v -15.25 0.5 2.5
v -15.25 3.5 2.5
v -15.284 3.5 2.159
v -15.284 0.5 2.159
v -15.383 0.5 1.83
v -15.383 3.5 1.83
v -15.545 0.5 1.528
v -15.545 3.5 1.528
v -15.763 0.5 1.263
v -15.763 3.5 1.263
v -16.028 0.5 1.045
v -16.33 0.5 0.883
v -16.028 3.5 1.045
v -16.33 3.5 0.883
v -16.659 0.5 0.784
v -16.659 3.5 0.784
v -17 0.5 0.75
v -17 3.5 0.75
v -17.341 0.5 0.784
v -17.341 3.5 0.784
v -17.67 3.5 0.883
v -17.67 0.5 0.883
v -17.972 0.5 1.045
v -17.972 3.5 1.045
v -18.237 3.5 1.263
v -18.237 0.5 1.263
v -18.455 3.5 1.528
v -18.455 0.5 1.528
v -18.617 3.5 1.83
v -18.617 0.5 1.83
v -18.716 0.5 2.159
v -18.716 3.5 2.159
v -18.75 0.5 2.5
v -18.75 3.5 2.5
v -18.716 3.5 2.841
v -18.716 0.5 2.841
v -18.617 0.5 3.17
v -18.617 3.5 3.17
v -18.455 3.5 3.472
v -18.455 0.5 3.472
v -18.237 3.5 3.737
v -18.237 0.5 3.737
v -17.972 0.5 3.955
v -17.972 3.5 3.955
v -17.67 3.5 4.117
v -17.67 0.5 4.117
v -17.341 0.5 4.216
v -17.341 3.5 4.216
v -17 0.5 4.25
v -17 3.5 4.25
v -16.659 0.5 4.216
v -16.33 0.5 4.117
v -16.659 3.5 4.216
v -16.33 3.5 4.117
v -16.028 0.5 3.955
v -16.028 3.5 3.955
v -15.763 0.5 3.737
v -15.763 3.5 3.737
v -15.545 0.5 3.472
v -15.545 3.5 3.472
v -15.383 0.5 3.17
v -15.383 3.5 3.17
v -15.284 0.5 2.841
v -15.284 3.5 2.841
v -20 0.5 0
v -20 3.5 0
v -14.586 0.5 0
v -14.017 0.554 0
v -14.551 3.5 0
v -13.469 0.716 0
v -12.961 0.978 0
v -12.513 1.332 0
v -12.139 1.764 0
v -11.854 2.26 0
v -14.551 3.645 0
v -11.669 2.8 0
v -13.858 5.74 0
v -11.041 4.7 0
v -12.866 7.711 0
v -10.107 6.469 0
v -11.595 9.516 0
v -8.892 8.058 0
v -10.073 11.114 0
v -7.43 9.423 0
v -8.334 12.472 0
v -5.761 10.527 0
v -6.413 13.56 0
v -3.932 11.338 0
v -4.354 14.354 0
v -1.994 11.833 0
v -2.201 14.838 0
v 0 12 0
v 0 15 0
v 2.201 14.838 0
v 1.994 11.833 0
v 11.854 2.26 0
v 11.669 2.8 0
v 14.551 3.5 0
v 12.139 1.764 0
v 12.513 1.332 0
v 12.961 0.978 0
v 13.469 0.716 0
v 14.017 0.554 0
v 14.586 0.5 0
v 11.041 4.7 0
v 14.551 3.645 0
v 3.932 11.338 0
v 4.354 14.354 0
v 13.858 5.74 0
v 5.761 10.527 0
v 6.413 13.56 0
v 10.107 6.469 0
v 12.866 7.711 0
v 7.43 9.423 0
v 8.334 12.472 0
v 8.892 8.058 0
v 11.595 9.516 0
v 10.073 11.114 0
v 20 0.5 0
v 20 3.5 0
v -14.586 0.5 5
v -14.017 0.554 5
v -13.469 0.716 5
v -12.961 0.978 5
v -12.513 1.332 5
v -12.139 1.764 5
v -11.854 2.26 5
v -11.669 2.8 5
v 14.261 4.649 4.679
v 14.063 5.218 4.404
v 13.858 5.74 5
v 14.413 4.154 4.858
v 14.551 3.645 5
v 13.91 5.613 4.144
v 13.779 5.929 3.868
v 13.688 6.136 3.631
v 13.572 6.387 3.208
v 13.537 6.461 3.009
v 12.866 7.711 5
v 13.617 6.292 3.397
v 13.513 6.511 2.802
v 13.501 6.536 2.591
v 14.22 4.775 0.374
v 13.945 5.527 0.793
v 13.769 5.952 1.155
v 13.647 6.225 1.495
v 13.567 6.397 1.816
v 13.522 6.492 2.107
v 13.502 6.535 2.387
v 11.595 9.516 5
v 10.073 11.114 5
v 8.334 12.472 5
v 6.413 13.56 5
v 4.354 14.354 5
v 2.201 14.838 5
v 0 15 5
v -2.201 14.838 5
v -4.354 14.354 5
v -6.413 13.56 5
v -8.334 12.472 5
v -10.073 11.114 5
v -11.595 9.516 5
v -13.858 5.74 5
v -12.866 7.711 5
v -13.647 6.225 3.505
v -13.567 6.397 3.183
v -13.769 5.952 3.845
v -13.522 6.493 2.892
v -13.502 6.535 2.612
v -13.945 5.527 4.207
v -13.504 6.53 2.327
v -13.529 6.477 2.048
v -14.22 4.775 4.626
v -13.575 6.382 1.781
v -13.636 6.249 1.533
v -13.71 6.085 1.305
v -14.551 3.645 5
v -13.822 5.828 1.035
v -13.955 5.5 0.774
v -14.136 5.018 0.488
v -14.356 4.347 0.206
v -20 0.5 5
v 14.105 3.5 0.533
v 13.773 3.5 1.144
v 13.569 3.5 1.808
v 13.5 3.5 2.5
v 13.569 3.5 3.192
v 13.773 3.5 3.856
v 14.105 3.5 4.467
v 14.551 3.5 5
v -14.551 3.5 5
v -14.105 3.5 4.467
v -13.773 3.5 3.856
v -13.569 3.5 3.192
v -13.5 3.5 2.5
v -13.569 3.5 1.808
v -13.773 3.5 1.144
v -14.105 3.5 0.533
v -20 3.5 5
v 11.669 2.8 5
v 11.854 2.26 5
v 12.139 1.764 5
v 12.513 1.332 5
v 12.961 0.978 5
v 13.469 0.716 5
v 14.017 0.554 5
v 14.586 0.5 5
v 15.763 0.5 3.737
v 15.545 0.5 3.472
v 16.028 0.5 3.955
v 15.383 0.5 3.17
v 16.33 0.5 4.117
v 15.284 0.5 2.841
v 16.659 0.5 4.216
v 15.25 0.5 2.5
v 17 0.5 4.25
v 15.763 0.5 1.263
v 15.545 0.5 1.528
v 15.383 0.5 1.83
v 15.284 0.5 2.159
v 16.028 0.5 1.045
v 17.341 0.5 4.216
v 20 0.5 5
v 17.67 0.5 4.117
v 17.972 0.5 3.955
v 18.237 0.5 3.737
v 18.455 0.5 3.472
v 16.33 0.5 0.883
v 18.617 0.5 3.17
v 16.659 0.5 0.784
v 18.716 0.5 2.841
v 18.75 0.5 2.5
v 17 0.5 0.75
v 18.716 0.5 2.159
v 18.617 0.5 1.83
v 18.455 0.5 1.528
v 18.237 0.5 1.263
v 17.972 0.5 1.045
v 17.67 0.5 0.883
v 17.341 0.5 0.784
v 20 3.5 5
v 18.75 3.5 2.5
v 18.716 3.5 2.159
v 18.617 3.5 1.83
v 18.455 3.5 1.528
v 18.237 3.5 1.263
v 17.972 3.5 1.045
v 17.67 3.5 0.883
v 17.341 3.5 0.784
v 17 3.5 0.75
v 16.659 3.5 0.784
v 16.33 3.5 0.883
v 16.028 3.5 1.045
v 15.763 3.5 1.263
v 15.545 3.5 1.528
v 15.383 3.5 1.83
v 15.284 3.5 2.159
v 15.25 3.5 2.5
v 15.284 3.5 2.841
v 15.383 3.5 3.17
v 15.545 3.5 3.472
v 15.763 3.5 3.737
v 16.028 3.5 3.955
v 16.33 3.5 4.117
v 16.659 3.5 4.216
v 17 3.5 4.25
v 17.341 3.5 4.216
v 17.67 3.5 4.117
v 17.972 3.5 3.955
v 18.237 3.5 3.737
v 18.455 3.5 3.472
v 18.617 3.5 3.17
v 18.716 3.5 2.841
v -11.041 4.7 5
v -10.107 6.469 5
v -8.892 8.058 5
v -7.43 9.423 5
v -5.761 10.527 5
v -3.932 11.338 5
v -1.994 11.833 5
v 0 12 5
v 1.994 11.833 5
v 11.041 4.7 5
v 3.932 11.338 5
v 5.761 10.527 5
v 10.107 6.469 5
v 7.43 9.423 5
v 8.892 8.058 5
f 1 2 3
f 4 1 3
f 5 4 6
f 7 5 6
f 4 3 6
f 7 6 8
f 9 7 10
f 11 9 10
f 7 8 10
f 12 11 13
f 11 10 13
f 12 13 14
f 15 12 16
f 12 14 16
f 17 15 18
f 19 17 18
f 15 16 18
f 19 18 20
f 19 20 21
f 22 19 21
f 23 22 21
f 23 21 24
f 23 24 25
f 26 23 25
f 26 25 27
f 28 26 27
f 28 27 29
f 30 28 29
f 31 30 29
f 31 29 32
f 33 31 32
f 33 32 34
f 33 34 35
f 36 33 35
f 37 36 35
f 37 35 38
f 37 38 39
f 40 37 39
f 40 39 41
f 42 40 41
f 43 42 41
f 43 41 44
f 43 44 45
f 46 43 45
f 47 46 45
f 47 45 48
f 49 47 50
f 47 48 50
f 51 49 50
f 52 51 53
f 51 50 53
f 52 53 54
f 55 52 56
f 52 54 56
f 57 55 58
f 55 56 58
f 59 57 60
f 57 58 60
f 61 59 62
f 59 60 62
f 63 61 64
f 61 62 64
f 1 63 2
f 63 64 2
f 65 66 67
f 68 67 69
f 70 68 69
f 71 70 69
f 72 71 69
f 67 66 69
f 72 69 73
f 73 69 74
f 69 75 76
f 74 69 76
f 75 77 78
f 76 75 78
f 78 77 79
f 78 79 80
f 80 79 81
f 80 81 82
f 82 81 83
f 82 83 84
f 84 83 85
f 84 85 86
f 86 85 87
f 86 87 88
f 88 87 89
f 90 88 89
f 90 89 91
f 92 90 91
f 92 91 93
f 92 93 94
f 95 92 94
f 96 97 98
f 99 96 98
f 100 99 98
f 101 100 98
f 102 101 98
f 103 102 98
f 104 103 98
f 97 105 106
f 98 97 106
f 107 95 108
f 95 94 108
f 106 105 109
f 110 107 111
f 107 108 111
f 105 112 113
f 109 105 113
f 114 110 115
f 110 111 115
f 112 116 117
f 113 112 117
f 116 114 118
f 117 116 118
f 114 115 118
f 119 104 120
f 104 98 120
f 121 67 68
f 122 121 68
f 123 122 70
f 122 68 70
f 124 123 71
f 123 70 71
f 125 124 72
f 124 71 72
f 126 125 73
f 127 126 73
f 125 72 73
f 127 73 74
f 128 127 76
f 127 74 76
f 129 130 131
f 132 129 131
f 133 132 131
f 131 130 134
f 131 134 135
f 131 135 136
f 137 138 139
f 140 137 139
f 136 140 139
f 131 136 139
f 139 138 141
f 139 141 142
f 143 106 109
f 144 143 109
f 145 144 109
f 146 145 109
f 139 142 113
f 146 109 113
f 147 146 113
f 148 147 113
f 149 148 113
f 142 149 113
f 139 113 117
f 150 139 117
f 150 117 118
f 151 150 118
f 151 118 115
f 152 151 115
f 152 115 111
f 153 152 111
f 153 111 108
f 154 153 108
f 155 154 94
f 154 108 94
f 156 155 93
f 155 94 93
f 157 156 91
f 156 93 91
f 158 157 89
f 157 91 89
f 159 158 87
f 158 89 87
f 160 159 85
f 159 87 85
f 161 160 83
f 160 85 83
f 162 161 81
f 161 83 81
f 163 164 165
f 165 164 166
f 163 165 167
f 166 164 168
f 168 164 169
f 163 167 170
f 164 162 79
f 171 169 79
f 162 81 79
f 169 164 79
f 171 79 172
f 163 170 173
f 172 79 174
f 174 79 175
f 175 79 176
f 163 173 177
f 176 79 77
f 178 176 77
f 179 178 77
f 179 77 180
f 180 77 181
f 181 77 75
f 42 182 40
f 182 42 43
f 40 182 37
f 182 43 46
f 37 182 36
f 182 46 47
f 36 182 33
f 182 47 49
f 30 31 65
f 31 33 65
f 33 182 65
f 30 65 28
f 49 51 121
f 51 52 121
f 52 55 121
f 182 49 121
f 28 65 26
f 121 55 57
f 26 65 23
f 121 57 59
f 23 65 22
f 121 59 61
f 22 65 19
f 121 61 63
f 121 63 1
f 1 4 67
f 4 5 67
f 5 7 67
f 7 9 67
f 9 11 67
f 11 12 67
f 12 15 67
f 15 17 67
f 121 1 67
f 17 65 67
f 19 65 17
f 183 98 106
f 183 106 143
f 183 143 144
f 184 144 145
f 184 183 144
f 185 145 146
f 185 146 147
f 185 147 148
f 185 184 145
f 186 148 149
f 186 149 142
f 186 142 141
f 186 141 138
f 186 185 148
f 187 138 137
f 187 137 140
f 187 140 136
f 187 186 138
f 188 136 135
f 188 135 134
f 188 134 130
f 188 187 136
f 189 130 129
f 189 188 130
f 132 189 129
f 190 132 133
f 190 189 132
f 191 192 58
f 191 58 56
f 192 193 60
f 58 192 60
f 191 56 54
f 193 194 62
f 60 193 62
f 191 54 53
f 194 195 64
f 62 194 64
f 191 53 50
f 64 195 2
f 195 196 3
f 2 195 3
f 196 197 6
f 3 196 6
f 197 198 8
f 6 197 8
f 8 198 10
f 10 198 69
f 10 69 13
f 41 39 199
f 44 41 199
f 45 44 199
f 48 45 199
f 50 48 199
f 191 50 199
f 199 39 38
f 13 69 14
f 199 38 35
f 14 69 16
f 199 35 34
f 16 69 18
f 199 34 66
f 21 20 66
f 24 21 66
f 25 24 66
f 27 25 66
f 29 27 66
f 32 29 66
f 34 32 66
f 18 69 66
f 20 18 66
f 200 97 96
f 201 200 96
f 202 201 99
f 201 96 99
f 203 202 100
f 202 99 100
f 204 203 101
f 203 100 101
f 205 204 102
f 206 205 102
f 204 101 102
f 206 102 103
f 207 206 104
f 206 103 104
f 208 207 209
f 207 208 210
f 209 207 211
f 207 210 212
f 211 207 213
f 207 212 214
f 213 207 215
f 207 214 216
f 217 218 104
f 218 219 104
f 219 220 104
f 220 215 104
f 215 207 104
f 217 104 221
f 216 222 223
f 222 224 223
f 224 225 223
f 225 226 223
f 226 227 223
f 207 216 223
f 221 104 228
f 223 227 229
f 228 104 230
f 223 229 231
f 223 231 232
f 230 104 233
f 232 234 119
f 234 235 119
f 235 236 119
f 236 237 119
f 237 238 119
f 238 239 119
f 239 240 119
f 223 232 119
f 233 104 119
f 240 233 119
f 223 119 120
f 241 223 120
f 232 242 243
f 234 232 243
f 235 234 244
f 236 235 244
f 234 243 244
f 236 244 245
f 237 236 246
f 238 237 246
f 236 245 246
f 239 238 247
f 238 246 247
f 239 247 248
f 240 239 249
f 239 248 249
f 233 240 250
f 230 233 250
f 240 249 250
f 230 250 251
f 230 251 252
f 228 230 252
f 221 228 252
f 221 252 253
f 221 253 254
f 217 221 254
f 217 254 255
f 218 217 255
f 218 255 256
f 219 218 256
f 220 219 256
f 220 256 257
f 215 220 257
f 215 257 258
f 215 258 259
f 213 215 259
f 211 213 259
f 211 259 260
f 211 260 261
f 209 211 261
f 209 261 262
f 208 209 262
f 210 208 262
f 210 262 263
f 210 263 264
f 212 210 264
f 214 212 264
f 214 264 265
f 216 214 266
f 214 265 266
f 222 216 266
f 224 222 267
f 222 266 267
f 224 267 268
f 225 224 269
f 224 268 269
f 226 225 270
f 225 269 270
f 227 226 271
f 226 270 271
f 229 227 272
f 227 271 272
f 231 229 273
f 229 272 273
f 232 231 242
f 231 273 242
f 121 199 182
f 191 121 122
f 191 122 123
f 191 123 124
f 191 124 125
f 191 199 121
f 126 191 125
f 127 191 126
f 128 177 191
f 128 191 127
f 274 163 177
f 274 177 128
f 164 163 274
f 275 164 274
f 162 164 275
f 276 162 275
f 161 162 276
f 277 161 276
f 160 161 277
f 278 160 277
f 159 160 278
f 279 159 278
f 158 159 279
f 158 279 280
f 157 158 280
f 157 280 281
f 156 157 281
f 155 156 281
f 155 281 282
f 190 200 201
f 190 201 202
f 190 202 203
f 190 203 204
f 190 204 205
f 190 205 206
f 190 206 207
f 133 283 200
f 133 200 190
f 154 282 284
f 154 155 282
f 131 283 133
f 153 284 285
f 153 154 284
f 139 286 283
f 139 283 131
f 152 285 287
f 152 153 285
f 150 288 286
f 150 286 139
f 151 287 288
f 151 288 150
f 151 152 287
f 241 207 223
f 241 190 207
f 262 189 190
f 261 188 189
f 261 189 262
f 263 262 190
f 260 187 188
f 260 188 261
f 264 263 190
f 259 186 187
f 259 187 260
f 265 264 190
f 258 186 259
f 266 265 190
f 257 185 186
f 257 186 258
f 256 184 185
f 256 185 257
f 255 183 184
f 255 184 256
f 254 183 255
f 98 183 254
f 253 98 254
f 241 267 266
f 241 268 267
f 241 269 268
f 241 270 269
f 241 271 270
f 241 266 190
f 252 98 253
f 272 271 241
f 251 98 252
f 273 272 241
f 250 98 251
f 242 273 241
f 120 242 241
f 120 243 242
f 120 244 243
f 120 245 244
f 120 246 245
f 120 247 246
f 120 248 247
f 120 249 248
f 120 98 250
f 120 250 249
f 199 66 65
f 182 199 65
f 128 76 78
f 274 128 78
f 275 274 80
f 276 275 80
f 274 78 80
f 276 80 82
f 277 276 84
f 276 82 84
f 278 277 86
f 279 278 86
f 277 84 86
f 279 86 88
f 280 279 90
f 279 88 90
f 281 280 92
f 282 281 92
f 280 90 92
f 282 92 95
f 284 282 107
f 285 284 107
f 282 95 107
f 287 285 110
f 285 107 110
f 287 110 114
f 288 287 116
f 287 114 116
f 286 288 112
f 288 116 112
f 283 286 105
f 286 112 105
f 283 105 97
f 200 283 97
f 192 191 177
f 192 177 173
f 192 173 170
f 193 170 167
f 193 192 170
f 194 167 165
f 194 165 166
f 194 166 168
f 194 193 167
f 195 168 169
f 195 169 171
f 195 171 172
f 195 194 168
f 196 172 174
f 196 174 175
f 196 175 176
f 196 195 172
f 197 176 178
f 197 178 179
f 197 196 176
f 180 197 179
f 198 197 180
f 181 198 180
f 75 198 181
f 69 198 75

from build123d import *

# Parameters (mm, degrees)
BOSS_EXTRU_2_DEPTH      = 5
ESQUISSE3_R             = 1.75
ENL_V_MAT_EXTRU_2_DEPTH = 4
ESQUISSE4_R             = 3.5
ENL_V_MAT_EXTRU_3_DEPTH = 12.5


with BuildPart() as part:
    # Esquisse1 → Boss.-Extru.2 (new body)
    with BuildSketch(Plane.XY):
        with BuildLine():
            Line((-20, 0.5), (-14.585952146, 0.5))
            ThreePointArc((-14.585952146, 0.5), (-12.728534584, 1.144156202), (-11.668761717, 2.8))
            ThreePointArc((-11.668761717, 2.8), (0, 12), (11.668761717, 2.8))
            ThreePointArc((11.668761717, 2.8), (12.728534584, 1.144156202), (14.585952146, 0.5))
            Line((14.585952146, 0.5), (20, 0.5))
            Line((20, 0.5), (20, 3.5))
            Line((20, 3.5), (14.585952146, 3.5))
            ThreePointArc((14.585952146, 3.5), (0, 15), (-14.585952146, 3.5))
            Line((-14.585952146, 3.5), (-20, 3.5))
            Line((-20, 3.5), (-20, 0.5))
        make_face()
    extrude(amount=BOSS_EXTRU_2_DEPTH)

    # Esquisse3 → Enlèv. mat.-Extru.2 (cut, through all)
    with BuildSketch(Plane(origin=(0, 3.5, 0), x_dir=(1, 0, 0), z_dir=(0, 1, 0))):
        with Locations((-17, -2.5)):
            Circle(ESQUISSE3_R)
        with Locations((17, -2.5)):
            Circle(ESQUISSE3_R)
    extrude(amount=-ENL_V_MAT_EXTRU_2_DEPTH, mode=Mode.SUBTRACT)

    # Esquisse4 → Enlèv. mat.-Extru.3 (cut, through all)
    with BuildSketch(Plane(origin=(0, 3.5, 0), x_dir=(1, 0, 0), z_dir=(0, 1, 0))):
        with Locations((-17, -2.5)):
            Circle(ESQUISSE4_R)
        with Locations((17, -2.5)):
            Circle(ESQUISSE4_R)
    extrude(amount=ENL_V_MAT_EXTRU_3_DEPTH, mode=Mode.SUBTRACT)


solid = part.part
